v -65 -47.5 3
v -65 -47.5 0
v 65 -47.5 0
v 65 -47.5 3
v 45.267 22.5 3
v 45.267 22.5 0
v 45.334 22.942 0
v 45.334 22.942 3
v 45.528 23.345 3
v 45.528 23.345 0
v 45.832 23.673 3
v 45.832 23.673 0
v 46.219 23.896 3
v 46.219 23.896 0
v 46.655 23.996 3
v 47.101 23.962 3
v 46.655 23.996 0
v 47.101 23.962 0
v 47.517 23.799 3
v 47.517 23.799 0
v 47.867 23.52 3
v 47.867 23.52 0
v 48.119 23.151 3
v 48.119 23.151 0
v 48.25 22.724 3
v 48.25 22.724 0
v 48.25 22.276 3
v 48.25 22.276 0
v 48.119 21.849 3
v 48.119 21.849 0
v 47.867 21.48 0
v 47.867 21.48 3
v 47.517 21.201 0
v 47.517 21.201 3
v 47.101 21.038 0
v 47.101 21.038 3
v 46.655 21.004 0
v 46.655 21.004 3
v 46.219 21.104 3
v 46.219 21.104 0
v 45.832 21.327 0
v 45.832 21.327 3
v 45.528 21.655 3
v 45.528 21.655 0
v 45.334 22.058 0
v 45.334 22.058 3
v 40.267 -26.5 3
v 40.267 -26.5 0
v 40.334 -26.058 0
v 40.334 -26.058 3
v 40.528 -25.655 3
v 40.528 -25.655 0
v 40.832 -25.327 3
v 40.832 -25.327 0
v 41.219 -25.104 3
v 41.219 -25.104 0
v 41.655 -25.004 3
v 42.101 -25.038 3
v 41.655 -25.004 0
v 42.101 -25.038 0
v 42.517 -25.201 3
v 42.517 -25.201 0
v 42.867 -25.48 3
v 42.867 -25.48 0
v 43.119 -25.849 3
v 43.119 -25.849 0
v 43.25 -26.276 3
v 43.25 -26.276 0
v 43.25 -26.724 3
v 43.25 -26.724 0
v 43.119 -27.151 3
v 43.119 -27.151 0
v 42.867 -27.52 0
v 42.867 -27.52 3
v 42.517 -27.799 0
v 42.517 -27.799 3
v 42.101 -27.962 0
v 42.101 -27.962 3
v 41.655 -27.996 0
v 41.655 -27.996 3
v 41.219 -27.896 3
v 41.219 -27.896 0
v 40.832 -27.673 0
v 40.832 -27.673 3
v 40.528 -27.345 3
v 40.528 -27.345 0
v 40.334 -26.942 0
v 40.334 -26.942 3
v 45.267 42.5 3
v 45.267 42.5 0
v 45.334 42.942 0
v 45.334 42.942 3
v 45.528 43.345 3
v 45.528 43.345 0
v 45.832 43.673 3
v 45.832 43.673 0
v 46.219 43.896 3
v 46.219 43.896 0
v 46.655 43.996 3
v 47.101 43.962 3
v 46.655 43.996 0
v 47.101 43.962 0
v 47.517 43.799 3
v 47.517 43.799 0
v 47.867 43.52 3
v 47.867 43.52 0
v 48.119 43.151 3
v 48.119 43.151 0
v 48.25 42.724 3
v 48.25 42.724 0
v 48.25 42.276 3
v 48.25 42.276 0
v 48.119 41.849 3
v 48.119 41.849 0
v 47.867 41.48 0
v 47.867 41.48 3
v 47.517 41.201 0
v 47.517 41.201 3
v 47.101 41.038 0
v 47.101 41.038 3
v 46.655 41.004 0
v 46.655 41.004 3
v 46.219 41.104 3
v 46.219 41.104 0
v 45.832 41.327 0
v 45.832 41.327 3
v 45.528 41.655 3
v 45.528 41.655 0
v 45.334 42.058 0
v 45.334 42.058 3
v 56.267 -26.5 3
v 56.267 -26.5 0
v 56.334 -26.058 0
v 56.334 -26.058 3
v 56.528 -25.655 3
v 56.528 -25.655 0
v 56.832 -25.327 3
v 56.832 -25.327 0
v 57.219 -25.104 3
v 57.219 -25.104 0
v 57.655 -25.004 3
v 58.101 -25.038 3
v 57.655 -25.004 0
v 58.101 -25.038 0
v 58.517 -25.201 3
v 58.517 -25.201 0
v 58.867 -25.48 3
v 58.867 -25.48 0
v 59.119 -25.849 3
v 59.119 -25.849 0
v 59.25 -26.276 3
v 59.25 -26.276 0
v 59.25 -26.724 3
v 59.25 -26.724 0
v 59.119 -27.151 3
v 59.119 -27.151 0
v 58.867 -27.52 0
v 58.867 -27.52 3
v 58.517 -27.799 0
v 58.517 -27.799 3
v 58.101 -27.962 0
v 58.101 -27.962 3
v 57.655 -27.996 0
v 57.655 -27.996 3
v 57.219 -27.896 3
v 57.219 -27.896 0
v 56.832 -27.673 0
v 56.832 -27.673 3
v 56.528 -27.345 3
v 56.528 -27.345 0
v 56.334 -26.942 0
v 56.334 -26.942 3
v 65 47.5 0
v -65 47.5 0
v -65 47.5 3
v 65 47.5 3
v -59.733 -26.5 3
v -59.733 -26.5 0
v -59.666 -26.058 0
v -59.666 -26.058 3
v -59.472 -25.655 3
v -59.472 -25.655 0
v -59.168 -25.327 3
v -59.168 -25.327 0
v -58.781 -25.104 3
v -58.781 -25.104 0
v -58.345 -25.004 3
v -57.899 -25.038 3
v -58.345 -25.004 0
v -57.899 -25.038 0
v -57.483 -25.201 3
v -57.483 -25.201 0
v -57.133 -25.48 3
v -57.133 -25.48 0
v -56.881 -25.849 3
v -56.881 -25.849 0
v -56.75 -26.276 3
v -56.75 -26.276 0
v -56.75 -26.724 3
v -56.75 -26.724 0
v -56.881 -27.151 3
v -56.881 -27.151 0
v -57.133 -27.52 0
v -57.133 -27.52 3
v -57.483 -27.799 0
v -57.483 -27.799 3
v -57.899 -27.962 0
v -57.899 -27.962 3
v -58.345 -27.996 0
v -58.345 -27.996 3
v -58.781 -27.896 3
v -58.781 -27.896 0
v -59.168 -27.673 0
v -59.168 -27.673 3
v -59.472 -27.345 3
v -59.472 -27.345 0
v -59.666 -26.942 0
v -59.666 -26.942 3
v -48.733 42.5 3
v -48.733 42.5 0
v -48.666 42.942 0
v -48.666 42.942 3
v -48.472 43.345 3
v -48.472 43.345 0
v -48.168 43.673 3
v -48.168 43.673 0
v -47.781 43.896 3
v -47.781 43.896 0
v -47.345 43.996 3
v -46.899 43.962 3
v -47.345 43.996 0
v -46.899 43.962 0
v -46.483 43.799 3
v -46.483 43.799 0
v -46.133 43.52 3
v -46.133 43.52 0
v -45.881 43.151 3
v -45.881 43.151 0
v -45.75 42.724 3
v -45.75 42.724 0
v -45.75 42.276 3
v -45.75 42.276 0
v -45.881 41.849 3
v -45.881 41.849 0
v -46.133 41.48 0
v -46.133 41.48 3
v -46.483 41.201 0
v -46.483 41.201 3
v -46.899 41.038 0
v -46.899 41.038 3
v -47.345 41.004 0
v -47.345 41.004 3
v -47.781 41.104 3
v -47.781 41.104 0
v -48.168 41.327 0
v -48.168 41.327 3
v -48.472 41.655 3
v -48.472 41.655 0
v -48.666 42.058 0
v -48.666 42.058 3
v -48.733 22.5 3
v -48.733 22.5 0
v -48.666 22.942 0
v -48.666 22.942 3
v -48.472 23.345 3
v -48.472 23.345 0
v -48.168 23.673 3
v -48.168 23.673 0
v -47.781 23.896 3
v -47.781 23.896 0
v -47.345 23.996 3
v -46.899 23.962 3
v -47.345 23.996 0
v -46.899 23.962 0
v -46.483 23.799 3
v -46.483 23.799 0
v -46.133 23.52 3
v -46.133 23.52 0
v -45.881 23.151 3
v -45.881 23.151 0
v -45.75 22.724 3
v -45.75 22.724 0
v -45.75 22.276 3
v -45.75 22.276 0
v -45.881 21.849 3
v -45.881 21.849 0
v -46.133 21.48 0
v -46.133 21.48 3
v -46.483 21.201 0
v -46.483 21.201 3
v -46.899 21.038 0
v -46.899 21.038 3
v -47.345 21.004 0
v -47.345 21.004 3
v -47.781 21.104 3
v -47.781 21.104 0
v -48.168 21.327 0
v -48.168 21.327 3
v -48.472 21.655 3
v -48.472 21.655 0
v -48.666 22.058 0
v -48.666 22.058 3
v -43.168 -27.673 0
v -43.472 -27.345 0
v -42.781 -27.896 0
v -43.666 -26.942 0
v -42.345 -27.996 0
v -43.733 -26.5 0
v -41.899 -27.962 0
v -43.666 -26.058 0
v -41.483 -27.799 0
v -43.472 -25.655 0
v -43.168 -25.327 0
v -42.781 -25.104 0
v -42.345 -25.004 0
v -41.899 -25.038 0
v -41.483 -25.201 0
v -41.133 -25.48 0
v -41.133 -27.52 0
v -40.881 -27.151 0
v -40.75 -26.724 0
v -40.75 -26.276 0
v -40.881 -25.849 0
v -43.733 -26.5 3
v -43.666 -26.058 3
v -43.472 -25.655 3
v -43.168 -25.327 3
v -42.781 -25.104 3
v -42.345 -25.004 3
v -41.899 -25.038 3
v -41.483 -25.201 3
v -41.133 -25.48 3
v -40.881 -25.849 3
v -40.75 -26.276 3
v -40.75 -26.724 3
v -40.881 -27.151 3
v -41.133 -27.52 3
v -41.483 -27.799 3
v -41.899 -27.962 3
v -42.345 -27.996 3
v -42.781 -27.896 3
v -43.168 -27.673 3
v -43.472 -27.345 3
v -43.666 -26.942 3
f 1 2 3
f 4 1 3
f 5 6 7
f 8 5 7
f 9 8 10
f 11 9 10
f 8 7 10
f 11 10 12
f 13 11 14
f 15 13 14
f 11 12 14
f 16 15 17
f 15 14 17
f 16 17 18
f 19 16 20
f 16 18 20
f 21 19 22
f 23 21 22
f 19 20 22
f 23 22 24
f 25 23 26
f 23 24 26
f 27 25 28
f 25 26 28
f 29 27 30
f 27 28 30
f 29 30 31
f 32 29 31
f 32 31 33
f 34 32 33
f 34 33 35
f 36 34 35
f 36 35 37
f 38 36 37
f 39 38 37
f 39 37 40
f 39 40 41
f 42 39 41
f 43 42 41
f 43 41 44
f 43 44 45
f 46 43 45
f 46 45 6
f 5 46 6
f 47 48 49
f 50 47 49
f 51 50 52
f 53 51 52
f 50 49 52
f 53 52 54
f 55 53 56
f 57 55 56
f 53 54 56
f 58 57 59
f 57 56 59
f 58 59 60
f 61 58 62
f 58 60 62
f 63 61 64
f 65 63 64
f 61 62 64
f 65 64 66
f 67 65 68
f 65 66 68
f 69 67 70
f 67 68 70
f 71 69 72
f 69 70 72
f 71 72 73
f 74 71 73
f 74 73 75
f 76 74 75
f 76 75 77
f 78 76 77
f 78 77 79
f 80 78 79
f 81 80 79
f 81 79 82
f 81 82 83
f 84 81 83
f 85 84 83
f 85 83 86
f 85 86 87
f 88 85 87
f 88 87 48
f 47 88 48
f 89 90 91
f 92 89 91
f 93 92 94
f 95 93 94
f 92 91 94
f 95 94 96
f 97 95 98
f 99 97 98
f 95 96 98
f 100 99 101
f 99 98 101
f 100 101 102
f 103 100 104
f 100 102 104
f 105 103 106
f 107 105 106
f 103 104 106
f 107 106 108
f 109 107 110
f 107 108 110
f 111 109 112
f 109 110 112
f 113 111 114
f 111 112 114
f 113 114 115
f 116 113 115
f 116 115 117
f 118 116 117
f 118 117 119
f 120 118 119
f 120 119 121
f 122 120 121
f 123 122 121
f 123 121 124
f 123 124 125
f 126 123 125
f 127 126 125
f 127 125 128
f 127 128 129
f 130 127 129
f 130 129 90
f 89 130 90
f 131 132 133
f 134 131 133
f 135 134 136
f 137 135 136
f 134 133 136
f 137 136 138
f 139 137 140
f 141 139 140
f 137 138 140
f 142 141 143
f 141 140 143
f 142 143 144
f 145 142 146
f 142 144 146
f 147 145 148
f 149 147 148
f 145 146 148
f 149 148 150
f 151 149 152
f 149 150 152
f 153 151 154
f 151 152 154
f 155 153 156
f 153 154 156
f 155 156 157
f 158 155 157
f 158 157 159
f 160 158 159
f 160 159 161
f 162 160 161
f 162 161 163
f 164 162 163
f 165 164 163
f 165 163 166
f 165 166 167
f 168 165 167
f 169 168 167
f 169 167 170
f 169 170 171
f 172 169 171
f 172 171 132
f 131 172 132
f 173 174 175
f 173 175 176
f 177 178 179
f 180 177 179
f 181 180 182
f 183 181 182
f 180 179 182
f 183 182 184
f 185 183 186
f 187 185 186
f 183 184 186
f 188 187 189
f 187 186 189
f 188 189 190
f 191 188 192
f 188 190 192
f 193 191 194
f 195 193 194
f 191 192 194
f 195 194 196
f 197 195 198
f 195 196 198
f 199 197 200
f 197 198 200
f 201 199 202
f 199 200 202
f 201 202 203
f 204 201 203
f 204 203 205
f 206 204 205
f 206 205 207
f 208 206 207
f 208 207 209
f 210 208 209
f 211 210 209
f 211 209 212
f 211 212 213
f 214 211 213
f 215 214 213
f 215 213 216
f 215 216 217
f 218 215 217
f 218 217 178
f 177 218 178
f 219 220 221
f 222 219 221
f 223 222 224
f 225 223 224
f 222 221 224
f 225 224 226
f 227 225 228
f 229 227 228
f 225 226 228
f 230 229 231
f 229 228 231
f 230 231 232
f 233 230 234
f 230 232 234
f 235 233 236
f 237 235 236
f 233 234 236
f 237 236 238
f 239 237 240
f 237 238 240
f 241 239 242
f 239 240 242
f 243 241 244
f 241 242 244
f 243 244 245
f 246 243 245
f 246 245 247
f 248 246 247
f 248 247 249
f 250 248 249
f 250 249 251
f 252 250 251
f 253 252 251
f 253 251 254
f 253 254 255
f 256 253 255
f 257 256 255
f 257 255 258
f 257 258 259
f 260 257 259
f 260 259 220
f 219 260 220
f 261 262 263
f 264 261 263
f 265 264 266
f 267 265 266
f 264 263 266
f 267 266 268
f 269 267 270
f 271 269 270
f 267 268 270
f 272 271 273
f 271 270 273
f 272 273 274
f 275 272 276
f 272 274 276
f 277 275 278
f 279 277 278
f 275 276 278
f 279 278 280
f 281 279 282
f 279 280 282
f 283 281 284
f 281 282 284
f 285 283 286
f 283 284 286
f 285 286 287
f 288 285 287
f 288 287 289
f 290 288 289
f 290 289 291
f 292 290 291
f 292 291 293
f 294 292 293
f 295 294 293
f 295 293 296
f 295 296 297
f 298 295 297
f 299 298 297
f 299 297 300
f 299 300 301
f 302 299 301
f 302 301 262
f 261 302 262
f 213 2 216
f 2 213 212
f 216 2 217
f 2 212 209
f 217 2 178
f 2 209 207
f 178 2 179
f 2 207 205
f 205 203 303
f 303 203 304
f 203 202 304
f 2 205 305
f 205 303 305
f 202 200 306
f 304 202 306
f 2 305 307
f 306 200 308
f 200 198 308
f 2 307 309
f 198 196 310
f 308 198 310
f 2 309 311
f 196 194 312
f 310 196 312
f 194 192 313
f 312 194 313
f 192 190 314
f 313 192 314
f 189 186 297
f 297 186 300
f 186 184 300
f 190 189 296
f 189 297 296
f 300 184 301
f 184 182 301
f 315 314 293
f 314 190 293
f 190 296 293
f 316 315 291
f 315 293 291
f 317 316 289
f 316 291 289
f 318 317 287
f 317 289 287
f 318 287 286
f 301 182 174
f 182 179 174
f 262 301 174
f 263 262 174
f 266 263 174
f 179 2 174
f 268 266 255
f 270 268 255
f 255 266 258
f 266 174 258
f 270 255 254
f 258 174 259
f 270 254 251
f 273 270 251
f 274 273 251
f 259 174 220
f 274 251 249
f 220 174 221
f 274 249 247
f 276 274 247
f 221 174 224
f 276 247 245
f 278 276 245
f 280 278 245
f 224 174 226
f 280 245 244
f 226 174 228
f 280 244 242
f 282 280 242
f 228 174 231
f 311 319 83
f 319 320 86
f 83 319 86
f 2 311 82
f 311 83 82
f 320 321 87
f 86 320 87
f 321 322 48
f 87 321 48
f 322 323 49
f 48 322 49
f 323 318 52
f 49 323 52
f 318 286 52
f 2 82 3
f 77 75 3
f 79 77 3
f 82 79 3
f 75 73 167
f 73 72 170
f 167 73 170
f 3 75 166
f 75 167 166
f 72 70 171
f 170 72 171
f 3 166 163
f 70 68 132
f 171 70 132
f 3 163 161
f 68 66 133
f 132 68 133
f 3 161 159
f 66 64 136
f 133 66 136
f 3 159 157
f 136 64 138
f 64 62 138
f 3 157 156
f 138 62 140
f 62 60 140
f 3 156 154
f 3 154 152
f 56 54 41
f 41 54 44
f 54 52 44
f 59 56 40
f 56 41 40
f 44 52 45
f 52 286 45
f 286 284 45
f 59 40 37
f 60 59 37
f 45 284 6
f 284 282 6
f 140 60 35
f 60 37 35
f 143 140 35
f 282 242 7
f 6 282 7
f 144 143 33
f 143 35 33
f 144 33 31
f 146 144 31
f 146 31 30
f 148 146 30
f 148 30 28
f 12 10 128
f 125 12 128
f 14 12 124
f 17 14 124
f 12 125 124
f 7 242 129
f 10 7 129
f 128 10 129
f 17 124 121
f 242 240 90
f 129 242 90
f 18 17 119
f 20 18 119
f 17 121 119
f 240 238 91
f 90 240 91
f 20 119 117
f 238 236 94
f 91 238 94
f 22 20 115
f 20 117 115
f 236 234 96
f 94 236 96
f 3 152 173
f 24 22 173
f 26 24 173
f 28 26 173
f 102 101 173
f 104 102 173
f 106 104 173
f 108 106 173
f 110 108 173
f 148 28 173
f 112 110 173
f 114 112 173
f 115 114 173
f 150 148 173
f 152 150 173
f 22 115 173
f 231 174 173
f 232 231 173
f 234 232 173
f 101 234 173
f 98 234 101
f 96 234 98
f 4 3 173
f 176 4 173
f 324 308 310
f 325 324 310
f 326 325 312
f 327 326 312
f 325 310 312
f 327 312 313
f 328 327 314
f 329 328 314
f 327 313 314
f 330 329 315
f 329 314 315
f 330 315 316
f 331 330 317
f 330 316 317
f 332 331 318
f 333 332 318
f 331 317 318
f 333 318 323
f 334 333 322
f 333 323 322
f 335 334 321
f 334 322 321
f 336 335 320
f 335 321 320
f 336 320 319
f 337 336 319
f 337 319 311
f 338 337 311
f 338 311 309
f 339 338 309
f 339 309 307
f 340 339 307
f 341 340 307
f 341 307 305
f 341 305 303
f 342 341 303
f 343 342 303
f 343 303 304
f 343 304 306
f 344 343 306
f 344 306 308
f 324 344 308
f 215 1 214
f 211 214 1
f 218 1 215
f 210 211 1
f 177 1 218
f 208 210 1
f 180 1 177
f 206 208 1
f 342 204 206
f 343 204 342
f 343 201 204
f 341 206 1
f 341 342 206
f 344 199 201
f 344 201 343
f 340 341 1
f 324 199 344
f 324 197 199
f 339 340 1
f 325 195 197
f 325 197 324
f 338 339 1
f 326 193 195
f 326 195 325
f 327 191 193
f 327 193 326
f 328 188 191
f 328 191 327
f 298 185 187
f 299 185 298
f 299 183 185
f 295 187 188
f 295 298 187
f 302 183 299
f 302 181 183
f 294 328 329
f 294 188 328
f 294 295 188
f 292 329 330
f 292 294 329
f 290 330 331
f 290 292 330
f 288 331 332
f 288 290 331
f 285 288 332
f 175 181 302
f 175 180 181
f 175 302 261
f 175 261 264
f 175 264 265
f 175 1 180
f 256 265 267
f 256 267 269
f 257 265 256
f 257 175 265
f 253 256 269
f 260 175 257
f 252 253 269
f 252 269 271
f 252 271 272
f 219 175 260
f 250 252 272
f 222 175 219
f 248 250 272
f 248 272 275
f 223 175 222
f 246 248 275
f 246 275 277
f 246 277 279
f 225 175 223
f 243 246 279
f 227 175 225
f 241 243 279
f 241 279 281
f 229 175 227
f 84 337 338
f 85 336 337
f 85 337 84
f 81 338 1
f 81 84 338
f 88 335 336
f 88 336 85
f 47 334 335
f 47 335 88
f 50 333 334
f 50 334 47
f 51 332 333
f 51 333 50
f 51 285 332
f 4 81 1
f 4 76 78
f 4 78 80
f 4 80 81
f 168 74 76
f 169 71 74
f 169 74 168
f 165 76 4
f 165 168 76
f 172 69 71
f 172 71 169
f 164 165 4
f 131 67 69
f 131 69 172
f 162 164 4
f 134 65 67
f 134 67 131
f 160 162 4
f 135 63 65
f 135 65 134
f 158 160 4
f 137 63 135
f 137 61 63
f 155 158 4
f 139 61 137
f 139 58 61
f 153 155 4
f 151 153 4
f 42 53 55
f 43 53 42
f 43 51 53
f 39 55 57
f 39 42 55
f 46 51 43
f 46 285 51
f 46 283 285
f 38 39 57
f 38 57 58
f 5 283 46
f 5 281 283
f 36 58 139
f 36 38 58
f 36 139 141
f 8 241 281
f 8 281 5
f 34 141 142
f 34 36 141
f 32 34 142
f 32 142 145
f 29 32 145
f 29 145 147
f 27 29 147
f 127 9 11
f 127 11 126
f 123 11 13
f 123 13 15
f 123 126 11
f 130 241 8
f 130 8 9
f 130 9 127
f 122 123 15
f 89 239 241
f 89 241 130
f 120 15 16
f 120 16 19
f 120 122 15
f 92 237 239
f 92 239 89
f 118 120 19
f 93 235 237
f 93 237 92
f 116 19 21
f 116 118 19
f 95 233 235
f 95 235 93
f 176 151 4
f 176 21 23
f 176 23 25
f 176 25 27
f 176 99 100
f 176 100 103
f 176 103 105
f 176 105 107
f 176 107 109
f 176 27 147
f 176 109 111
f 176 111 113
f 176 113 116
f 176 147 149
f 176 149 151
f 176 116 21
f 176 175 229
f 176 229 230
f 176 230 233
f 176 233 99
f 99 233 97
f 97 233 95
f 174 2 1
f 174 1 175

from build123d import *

# Parameters (mm, degrees)
SKETCH_1_W          = 130
SKETCH_1_H          = 95
EXTRUDE_1_DEPTH     = 3
SKETCH_3_R          = 1.5
CUT_EXTRUDE_2_DEPTH = 10
SKETCH_4_R          = 1.5
CUT_EXTRUDE_3_DEPTH = 10


with BuildPart() as part:
    # 草图1 → 凸台-拉伸1 (new body)
    with BuildSketch(Plane.XY):
        Rectangle(SKETCH_1_W, SKETCH_1_H)
    extrude(amount=EXTRUDE_1_DEPTH)

    # 草图3 → 切除-拉伸2 (cut)
    with BuildSketch(Plane(origin=(0, 0, 0), x_dir=(-1, 0, 0), z_dir=(0, 0, -1))):
        with Locations((-57.767112616, -26.5)):
            Circle(SKETCH_3_R)
        with Locations((-41.767112616, -26.5)):
            Circle(SKETCH_3_R)
        with Locations((42.232887384, -26.5)):
            Circle(SKETCH_3_R)
        with Locations((58.232887384, -26.5)):
            Circle(SKETCH_3_R)
    extrude(amount=-CUT_EXTRUDE_2_DEPTH, mode=Mode.SUBTRACT)

    # 草图4 → 切除-拉伸3 (cut)
    with BuildSketch(Plane(origin=(0, 0, 0), x_dir=(-1, 0, 0), z_dir=(0, 0, -1))):
        with Locations((-46.767112616, 42.5)):
            Circle(SKETCH_4_R)
        with Locations((-46.767112616, 22.5)):
            Circle(SKETCH_4_R)
        with Locations((47.232887384, 42.5)):
            Circle(SKETCH_4_R)
        with Locations((47.232887384, 22.5)):
            Circle(SKETCH_4_R)
    extrude(amount=-CUT_EXTRUDE_3_DEPTH, mode=Mode.SUBTRACT)


solid = part.part
